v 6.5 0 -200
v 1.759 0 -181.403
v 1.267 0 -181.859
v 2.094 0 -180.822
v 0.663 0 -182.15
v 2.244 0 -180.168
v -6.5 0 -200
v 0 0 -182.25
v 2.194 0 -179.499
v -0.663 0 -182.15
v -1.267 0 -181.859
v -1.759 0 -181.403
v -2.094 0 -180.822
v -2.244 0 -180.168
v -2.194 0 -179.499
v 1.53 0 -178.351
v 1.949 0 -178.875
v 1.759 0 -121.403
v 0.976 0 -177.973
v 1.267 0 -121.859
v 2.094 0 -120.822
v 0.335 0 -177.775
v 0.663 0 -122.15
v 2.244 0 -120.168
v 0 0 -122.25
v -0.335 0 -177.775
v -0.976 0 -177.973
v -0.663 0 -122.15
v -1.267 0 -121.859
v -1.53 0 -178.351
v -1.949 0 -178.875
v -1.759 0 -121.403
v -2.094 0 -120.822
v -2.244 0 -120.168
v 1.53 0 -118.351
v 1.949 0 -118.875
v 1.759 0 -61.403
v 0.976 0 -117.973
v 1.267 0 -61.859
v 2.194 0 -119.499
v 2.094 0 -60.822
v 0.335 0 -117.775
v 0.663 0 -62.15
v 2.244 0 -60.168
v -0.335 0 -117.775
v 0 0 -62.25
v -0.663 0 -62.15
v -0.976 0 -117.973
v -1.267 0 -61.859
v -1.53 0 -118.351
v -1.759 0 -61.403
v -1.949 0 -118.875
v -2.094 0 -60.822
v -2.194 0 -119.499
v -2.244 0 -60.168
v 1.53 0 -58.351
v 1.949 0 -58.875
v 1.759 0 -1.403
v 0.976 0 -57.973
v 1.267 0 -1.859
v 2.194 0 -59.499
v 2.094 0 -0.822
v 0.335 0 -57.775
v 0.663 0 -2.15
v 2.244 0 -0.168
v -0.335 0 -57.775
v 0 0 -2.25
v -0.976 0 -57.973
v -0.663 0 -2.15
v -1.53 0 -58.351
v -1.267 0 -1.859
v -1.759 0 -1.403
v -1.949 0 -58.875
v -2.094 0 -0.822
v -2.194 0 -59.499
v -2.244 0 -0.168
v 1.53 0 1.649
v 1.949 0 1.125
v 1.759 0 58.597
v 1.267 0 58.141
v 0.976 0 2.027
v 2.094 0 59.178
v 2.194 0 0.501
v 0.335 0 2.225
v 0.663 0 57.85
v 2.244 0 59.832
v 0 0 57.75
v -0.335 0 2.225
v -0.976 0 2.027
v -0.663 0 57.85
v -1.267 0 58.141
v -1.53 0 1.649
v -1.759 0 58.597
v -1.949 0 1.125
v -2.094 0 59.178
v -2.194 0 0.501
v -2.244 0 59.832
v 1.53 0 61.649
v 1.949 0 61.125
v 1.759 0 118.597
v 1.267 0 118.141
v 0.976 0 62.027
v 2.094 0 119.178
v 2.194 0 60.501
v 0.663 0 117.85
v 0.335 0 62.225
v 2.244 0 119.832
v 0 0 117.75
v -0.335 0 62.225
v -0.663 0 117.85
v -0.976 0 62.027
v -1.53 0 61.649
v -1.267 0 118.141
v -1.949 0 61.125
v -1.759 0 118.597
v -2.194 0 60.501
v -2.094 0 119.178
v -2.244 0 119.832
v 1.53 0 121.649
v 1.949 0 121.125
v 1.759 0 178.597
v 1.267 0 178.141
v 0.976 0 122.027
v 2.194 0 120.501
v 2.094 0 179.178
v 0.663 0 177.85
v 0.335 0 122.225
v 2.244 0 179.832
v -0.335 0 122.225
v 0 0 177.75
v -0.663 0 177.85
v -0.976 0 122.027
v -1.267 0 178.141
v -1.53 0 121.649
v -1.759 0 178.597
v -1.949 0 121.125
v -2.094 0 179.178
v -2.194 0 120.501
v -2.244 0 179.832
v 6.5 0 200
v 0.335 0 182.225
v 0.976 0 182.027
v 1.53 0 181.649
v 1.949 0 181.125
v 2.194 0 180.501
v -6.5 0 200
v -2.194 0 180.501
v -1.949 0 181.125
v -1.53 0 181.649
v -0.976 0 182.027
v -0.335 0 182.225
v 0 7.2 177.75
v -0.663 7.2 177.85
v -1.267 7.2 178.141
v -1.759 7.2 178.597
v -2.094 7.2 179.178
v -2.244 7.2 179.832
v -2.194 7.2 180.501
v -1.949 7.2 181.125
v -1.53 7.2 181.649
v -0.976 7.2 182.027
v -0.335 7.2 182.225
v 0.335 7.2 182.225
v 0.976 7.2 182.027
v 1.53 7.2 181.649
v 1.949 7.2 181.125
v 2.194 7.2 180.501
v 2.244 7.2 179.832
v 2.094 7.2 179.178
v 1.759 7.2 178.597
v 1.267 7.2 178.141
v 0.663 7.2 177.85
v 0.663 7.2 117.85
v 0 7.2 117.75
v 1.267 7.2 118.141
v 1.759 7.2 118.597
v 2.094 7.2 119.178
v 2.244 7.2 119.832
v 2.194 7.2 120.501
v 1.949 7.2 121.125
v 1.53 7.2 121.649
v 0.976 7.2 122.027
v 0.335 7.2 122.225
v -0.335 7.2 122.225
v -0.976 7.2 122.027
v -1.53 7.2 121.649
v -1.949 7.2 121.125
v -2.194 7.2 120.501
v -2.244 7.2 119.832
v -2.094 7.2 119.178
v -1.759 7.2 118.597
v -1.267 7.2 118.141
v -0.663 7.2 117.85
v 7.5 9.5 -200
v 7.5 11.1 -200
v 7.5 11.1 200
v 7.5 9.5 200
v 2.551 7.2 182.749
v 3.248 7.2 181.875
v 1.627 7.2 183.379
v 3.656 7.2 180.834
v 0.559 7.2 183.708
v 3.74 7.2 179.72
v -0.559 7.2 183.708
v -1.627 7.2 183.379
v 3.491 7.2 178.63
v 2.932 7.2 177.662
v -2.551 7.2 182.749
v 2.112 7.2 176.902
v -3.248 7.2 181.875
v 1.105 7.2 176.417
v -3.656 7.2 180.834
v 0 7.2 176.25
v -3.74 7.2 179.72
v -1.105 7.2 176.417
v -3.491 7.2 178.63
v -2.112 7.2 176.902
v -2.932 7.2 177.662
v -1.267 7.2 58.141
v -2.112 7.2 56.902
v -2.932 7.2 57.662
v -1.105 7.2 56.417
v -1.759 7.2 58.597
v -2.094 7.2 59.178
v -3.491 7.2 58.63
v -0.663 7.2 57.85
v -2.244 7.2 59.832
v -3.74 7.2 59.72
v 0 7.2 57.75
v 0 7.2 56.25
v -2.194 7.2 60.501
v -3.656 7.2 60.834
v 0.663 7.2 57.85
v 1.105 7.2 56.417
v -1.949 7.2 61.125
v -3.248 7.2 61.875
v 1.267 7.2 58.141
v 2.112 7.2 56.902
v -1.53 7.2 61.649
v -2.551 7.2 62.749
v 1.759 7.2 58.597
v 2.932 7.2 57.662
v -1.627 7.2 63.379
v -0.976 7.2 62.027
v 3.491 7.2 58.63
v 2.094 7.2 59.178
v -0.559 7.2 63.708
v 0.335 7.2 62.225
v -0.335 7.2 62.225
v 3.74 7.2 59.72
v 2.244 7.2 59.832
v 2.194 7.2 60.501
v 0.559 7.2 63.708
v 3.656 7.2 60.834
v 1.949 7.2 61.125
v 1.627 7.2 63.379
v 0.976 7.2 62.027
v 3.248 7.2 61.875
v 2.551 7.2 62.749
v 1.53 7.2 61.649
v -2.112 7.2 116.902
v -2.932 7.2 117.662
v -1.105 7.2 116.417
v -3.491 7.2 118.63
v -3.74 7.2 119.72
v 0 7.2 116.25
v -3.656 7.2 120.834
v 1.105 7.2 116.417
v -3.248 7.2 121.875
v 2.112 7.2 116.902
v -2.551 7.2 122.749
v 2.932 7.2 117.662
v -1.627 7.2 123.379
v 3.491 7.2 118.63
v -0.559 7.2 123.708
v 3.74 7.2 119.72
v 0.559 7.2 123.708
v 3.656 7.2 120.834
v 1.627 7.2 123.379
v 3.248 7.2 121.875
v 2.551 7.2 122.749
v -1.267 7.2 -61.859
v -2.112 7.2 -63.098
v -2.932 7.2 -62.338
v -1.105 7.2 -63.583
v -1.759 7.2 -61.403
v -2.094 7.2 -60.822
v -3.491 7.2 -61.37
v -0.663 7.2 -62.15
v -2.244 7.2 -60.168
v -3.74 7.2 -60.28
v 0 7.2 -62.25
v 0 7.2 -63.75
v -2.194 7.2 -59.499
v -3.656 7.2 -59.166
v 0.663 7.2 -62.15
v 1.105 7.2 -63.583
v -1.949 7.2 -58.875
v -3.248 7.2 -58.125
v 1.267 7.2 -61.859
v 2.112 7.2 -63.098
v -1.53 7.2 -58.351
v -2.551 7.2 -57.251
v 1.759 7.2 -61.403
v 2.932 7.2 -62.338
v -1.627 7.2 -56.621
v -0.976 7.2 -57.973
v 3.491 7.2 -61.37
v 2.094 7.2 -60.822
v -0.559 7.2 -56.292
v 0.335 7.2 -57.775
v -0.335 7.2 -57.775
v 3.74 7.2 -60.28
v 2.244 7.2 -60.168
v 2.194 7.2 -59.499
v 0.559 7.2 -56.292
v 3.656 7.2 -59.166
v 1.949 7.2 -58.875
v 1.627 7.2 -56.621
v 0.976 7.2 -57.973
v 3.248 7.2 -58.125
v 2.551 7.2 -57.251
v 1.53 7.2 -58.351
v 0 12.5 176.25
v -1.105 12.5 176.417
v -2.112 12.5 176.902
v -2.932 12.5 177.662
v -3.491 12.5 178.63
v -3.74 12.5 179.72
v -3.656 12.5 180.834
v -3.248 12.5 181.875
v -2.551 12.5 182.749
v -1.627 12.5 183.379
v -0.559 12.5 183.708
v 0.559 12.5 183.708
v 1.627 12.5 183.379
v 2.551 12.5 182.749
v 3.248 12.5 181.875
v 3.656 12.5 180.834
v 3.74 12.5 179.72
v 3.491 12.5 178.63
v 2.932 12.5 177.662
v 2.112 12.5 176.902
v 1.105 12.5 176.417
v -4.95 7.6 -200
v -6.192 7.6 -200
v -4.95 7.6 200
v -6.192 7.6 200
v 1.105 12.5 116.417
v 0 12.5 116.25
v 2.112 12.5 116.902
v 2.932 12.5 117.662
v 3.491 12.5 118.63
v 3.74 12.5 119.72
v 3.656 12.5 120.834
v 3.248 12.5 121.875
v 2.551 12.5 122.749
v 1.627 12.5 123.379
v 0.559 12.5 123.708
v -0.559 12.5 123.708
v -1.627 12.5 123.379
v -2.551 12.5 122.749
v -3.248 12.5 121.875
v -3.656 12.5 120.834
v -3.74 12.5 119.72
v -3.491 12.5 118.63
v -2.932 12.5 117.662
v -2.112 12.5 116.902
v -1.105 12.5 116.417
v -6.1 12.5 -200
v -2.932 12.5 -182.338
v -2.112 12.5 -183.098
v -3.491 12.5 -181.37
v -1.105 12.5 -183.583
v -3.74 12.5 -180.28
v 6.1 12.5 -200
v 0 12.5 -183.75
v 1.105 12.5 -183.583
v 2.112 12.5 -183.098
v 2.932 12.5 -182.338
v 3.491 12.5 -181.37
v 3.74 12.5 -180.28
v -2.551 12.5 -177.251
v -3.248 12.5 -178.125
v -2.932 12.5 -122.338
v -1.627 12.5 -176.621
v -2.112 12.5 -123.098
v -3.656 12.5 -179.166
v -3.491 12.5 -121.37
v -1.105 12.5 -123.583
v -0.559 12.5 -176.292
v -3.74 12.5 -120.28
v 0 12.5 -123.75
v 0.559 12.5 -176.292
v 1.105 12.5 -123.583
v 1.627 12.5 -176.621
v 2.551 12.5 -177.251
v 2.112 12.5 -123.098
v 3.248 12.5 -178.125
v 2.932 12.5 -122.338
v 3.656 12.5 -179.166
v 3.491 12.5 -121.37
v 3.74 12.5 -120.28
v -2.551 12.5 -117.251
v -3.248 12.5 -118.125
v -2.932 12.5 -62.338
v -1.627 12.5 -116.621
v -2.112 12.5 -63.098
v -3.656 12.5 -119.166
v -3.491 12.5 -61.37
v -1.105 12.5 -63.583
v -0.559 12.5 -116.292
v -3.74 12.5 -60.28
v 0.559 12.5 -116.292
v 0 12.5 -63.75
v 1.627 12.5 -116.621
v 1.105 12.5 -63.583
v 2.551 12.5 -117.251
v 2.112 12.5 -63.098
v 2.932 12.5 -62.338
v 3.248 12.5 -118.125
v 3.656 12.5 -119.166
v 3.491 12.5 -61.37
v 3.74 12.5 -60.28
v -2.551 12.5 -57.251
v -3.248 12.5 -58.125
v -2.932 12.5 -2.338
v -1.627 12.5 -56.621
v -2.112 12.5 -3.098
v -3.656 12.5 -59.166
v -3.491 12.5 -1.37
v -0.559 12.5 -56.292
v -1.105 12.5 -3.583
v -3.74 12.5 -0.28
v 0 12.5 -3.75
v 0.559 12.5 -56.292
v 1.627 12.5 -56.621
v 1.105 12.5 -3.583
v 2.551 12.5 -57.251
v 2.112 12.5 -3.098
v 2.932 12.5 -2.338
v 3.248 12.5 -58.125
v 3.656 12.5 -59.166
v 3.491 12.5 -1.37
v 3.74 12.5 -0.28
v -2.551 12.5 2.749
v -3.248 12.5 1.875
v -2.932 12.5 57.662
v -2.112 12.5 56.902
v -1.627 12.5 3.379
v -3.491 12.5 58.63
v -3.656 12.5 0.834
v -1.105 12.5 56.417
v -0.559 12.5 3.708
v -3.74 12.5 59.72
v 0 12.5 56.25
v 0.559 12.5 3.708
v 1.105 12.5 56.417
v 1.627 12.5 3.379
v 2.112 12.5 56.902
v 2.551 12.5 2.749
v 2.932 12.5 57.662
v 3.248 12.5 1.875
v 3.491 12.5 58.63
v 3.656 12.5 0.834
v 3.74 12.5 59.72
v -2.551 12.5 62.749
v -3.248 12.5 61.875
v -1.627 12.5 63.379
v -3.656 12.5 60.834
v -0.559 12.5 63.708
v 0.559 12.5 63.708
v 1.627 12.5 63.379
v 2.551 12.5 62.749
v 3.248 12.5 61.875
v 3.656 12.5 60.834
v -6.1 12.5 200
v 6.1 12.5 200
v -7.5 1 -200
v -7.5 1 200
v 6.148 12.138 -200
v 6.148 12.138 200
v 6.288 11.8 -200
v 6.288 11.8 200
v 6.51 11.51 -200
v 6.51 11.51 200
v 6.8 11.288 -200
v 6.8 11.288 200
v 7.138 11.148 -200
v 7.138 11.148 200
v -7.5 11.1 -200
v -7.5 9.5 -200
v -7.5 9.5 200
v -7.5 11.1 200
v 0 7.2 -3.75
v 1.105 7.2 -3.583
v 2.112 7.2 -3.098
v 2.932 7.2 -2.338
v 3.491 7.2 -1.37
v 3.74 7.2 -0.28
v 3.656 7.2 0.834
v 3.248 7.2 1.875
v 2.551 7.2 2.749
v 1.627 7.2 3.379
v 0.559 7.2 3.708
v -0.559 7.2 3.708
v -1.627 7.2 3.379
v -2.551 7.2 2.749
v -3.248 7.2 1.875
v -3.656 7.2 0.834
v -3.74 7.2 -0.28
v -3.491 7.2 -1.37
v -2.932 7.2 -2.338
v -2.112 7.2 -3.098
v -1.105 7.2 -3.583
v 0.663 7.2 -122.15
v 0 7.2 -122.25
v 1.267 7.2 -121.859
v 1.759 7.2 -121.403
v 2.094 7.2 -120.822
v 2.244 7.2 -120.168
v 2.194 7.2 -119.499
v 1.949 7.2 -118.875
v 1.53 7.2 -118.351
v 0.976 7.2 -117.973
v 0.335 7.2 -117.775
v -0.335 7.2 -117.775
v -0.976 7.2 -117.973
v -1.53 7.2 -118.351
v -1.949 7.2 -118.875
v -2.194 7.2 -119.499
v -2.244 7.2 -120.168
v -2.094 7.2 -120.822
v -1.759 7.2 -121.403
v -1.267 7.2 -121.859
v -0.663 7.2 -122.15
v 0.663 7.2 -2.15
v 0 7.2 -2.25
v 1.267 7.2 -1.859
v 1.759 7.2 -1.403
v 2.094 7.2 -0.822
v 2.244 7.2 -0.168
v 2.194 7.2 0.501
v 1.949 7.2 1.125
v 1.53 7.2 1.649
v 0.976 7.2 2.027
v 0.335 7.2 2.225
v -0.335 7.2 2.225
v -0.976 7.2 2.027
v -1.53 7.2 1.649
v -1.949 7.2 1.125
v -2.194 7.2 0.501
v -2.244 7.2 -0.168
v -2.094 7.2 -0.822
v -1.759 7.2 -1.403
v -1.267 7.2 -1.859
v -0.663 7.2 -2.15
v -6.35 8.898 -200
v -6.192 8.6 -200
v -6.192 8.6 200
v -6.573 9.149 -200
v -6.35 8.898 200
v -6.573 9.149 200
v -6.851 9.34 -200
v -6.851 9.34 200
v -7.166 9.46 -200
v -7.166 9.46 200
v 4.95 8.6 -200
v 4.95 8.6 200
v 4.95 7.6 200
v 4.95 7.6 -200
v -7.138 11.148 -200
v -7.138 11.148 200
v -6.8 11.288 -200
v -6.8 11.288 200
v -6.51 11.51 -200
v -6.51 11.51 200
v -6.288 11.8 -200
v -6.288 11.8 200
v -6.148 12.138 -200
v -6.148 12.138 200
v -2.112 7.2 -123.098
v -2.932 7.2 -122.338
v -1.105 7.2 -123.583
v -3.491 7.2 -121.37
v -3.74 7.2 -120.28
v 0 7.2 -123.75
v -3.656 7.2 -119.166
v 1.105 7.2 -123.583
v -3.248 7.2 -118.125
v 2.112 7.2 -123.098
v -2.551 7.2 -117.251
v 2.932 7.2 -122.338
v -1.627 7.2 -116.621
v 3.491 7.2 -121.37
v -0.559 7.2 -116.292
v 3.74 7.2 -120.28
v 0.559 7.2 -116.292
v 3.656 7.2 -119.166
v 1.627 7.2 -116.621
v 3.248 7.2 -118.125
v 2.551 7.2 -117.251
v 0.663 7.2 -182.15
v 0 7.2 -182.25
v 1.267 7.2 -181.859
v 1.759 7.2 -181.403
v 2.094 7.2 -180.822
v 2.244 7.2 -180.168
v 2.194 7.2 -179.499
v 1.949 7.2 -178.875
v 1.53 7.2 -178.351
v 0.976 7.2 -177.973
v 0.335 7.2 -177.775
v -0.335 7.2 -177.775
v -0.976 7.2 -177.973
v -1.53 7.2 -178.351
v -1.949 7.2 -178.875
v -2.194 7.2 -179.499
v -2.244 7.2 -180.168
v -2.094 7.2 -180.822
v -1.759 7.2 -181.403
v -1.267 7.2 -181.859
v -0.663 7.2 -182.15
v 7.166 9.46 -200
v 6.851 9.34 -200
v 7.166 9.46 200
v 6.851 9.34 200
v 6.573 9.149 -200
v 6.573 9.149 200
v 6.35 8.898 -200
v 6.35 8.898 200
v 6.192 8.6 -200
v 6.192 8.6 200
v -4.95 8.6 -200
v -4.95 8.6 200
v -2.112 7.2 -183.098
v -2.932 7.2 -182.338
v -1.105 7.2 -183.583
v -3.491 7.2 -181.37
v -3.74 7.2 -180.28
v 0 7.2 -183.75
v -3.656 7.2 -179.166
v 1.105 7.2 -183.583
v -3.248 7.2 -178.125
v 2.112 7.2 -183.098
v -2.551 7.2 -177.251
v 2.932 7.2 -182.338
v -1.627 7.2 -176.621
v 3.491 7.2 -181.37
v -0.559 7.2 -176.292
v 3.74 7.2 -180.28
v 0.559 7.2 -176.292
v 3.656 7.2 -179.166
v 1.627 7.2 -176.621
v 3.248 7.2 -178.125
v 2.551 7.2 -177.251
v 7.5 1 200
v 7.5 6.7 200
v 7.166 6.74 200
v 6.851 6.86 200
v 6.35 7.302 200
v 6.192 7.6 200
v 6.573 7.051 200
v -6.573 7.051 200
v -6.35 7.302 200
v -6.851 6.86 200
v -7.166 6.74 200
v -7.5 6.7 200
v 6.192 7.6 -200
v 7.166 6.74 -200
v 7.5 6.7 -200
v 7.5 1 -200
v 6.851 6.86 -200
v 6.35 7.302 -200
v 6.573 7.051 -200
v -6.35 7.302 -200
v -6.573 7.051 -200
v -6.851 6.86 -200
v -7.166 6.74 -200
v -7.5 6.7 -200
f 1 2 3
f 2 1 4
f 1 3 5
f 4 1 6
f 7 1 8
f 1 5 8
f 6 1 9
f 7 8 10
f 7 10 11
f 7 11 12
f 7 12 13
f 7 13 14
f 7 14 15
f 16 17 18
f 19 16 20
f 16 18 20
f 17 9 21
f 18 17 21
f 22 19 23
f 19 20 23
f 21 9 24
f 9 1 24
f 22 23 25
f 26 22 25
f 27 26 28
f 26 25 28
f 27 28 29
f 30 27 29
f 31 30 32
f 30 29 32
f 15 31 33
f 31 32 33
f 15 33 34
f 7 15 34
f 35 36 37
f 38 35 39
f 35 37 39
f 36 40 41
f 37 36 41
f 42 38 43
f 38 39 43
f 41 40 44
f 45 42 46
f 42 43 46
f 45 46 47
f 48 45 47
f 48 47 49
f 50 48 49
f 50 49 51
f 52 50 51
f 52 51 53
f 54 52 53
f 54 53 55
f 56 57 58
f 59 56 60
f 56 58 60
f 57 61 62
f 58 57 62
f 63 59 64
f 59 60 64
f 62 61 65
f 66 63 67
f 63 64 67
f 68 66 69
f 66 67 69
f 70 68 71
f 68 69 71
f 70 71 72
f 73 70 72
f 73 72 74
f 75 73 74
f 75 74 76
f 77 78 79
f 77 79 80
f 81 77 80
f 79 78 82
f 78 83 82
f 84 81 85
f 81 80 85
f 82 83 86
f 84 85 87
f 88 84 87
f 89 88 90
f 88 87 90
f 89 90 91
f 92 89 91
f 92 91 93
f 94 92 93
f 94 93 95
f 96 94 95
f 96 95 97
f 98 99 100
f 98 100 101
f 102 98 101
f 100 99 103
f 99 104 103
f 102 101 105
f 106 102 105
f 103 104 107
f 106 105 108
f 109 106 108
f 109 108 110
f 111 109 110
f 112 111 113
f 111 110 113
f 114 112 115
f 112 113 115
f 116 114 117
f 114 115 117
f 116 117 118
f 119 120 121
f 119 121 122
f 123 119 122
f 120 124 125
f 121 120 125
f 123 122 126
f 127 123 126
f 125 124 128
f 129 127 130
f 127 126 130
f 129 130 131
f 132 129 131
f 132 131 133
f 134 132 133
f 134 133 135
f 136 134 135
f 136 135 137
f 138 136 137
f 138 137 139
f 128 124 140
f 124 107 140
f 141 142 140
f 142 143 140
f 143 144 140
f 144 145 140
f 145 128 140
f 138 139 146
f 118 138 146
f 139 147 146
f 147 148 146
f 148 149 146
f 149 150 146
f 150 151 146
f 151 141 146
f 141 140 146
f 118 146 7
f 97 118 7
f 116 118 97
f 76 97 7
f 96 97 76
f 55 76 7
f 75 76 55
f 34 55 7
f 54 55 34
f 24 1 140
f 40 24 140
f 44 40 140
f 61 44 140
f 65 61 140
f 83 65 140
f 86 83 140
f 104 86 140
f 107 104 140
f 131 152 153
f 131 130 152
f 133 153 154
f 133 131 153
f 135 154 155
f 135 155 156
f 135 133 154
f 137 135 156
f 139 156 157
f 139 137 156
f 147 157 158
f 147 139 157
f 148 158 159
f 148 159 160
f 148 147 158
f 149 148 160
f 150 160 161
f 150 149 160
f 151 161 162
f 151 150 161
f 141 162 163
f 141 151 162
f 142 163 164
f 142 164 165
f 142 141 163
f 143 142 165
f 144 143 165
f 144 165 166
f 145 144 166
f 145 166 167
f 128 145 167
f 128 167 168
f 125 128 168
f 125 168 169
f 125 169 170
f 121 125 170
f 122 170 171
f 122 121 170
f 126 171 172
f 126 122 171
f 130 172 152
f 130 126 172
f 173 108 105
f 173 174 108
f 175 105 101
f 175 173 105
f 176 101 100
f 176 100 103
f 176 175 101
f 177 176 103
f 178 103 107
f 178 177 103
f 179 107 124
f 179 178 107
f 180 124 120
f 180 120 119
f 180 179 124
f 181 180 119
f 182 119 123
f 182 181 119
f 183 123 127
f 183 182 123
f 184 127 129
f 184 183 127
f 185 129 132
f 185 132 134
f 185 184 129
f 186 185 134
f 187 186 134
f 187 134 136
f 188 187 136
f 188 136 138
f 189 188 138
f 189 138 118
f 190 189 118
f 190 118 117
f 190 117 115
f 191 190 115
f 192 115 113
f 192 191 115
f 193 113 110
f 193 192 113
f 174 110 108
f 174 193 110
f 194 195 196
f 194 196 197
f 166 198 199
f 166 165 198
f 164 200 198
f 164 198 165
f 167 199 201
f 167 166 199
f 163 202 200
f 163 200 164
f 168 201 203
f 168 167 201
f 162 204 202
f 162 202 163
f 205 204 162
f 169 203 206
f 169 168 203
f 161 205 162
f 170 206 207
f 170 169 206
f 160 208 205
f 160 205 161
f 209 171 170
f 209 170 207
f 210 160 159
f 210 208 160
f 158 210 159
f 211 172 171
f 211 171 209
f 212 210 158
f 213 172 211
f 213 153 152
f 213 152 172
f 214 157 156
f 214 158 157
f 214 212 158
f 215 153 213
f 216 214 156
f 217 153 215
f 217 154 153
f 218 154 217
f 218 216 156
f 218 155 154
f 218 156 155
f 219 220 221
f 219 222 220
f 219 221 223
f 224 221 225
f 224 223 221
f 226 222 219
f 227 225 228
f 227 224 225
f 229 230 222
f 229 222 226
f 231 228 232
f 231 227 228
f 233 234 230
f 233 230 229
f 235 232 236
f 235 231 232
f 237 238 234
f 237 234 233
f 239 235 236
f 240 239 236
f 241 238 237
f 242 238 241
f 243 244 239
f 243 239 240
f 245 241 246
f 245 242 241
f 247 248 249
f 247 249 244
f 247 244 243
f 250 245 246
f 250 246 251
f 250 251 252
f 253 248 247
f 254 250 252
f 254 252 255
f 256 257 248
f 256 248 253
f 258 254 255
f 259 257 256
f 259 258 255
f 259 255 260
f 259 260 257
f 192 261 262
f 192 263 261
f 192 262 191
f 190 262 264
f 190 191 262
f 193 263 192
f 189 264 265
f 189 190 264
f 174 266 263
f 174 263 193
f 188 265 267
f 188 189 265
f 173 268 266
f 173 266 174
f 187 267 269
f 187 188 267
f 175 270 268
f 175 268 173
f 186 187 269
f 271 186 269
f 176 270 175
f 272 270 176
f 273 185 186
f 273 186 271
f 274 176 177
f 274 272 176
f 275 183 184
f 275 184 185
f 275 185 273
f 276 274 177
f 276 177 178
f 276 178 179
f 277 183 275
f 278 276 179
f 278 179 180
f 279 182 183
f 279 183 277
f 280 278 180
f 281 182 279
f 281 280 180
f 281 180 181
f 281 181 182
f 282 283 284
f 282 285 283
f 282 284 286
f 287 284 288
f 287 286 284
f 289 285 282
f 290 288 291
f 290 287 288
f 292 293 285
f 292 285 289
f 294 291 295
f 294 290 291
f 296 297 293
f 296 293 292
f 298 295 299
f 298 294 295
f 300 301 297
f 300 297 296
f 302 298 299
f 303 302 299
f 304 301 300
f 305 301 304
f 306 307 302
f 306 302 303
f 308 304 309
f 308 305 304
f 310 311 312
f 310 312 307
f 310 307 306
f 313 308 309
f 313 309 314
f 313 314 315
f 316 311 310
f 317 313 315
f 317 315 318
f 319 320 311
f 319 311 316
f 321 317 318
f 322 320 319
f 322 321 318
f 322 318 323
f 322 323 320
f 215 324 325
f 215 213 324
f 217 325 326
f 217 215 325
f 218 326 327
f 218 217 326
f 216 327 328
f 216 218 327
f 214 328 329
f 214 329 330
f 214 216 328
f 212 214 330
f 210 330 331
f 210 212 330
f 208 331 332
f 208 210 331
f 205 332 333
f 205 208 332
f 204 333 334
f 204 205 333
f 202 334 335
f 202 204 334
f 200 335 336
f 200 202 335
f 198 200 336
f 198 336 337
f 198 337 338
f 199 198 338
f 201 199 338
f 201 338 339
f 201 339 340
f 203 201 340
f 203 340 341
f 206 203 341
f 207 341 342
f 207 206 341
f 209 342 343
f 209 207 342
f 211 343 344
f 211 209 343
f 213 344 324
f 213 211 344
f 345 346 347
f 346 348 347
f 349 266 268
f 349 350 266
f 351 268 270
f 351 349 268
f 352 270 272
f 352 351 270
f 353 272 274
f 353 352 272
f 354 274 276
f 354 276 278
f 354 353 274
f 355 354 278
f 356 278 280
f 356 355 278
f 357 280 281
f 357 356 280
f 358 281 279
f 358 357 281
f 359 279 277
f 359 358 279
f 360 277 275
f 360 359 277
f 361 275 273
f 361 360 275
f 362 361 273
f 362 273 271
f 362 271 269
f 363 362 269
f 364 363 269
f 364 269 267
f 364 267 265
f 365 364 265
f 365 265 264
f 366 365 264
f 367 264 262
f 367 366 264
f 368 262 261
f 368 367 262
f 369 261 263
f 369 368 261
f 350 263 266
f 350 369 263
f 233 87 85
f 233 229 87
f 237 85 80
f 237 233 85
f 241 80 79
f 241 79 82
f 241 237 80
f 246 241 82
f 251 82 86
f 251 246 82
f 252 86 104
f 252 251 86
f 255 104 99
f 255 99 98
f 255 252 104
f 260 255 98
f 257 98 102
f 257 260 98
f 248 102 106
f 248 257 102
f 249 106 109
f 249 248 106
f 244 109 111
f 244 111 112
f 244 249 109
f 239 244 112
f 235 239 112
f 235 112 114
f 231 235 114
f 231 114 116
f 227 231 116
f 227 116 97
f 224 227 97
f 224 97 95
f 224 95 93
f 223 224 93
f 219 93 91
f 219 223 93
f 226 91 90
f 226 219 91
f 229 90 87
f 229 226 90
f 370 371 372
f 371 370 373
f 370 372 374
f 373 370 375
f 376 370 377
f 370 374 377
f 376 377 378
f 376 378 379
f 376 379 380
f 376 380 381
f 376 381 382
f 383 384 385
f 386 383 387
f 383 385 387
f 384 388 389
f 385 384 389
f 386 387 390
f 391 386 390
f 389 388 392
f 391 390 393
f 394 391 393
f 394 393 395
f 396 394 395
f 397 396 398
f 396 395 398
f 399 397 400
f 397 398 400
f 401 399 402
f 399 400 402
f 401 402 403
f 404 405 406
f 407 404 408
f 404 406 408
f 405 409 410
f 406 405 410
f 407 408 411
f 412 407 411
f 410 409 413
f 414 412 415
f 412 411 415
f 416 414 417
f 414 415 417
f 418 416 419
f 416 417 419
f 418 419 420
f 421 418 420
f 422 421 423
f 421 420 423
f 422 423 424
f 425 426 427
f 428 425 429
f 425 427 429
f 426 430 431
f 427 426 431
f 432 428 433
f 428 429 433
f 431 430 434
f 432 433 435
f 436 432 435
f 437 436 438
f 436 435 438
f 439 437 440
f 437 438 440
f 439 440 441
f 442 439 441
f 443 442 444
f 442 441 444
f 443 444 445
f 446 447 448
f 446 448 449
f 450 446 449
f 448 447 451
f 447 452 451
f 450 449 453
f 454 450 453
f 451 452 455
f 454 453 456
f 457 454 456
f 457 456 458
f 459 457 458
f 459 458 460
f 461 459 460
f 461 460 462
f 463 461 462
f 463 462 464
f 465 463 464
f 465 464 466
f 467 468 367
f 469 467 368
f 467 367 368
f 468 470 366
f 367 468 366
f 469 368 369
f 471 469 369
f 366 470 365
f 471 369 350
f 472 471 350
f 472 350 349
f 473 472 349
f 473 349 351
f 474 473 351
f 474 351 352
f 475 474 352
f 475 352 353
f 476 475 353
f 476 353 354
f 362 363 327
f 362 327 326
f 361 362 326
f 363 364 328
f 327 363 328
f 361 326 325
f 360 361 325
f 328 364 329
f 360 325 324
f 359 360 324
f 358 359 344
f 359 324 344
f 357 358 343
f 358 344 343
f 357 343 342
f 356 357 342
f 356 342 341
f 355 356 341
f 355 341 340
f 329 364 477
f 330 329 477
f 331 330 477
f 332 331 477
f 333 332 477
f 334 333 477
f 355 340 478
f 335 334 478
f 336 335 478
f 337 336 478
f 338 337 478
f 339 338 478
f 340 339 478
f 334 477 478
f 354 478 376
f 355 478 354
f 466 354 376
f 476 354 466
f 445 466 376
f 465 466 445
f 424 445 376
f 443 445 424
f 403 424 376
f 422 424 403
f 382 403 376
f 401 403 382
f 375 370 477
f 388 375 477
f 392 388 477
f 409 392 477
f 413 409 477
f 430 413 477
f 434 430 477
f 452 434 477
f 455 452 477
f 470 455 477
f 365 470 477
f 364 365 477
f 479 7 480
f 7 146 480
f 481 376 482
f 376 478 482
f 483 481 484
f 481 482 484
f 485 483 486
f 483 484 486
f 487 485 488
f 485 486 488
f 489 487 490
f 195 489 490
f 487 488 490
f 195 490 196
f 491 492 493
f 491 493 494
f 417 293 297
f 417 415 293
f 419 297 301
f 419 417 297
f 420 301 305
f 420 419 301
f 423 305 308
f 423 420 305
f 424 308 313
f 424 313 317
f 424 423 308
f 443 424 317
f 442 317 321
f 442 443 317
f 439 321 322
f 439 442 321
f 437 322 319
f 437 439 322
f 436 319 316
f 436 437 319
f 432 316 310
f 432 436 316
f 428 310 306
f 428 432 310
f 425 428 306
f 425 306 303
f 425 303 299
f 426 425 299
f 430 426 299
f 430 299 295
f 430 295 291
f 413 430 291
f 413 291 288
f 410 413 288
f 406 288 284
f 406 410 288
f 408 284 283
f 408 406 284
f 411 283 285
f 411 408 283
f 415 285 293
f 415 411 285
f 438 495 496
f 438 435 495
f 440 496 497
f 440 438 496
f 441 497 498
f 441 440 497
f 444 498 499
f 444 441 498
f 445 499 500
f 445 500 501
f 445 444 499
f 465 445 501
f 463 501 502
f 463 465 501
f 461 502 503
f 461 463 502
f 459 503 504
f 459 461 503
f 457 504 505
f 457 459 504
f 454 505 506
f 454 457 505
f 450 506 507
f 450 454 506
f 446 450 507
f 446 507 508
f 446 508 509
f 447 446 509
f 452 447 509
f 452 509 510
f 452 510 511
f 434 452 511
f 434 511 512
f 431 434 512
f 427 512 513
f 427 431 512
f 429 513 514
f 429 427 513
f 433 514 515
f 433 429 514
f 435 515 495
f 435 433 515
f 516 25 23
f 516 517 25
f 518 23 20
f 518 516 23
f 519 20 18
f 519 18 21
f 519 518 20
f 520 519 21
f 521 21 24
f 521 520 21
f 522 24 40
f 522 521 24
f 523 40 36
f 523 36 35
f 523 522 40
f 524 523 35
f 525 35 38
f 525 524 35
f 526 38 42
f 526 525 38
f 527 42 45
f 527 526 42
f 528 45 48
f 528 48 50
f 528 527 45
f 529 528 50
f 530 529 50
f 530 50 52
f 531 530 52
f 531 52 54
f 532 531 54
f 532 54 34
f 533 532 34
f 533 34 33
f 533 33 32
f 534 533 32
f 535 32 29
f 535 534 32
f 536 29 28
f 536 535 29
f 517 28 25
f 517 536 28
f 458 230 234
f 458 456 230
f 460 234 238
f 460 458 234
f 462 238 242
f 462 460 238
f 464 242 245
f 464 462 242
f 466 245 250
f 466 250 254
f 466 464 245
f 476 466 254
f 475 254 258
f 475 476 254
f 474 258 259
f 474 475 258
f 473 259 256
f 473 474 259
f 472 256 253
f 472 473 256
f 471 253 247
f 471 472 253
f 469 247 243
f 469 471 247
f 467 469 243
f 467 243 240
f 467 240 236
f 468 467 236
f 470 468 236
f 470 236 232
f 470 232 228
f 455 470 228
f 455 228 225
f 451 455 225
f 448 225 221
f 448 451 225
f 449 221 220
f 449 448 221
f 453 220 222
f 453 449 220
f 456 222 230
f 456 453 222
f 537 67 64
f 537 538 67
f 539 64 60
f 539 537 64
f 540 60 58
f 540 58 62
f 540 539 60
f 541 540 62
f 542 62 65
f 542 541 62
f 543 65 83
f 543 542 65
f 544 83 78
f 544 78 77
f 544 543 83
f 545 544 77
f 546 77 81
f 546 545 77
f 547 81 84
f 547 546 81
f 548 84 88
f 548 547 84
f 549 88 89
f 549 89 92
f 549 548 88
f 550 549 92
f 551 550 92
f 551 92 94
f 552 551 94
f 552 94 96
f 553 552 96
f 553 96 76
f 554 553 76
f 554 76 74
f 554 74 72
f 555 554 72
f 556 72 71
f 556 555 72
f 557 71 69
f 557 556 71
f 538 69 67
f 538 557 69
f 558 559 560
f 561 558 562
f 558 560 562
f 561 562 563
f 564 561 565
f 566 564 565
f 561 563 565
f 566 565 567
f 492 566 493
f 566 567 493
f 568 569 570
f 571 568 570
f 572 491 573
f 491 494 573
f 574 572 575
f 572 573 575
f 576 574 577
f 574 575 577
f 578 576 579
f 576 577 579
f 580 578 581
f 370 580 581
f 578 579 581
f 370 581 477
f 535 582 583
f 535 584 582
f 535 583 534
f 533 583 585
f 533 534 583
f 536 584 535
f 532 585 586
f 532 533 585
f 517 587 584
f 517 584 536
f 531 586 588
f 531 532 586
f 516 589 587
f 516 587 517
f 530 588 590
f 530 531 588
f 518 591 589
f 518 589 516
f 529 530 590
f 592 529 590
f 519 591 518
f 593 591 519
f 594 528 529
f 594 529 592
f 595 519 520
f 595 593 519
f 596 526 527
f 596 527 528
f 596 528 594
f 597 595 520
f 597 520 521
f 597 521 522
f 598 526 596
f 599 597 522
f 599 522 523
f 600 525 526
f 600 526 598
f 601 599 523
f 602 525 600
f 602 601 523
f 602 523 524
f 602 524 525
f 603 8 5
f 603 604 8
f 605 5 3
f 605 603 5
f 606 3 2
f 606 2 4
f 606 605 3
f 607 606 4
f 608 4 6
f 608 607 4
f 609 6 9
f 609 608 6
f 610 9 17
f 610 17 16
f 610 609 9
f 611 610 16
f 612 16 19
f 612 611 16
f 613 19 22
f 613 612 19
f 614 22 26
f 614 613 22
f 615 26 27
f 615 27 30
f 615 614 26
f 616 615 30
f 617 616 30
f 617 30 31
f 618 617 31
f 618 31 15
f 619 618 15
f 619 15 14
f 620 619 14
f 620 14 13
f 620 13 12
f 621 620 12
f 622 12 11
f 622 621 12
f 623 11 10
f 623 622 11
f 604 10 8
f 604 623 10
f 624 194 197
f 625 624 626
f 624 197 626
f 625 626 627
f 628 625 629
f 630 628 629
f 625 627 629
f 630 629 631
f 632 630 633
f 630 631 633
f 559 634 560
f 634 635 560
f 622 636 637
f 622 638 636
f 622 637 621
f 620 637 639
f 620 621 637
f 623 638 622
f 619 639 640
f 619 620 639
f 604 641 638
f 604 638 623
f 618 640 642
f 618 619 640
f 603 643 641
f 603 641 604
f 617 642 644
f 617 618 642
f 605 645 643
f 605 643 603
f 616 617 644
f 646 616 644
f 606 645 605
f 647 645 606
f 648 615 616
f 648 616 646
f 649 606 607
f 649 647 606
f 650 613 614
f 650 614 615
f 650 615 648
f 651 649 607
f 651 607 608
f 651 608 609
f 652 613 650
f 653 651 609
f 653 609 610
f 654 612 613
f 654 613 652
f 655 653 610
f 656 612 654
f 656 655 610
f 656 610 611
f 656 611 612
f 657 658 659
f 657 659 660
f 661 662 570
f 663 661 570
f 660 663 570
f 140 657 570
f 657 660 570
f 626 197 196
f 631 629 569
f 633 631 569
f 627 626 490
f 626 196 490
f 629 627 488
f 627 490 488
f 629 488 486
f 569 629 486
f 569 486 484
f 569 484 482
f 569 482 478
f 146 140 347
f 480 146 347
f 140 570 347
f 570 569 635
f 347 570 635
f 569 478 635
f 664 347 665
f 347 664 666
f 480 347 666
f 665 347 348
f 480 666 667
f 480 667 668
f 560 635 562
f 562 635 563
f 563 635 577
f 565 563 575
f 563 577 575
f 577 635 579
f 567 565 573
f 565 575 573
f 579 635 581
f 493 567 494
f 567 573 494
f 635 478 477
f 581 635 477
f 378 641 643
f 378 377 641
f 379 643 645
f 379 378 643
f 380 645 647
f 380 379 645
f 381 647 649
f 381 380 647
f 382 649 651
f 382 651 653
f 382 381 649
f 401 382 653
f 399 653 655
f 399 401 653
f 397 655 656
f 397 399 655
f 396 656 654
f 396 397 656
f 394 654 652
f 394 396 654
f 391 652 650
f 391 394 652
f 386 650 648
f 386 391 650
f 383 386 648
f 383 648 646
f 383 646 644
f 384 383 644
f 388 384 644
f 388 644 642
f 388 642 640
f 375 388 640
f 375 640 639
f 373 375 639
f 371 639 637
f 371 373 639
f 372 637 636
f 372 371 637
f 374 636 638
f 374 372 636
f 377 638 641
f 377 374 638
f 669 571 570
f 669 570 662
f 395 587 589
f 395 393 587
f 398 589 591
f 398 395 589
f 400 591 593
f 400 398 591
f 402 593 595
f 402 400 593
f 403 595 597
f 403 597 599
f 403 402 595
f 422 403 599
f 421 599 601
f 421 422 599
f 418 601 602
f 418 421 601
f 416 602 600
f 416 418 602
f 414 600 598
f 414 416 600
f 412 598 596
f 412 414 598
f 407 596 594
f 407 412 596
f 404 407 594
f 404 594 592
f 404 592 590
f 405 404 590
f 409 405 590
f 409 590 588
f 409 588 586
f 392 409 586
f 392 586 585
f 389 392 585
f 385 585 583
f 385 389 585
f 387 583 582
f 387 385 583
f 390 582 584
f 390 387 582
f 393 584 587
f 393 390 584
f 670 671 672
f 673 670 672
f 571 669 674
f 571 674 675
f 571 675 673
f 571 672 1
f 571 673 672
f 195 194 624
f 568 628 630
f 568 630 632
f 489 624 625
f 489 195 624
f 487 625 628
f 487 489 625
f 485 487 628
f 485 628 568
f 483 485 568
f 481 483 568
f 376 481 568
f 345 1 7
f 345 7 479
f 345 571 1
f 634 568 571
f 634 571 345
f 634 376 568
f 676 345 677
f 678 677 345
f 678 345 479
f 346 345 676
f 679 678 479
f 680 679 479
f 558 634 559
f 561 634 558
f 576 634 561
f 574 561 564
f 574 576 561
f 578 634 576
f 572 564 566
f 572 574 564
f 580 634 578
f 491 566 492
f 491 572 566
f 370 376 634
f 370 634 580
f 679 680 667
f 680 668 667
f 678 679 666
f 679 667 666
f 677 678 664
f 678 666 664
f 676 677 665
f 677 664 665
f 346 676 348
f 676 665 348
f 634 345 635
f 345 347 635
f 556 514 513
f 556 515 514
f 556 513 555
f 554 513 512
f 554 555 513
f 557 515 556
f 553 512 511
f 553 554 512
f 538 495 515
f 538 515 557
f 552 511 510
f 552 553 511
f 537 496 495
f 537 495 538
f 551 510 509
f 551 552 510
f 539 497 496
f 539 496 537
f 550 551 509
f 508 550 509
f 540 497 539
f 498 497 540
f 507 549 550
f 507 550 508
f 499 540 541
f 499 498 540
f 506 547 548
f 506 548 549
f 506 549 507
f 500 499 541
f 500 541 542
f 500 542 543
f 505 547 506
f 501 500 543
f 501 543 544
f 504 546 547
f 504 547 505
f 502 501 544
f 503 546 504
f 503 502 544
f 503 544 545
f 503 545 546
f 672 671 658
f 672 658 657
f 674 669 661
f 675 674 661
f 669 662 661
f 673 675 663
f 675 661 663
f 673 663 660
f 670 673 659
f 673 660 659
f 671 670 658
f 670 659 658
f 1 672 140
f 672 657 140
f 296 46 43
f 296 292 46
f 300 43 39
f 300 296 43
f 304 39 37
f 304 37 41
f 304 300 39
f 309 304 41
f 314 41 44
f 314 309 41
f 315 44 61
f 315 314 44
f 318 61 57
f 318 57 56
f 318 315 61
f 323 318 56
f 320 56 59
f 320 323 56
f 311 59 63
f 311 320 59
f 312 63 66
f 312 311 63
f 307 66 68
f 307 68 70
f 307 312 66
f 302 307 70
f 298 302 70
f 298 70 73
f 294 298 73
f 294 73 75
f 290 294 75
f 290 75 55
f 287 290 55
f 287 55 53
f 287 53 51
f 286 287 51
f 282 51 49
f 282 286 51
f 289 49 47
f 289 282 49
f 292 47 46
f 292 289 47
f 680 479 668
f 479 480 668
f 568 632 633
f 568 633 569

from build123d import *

# Parameters (mm, degrees)
EXTRUDE1_DEPTH  = 200
LPATTERN1_COUNT = 6
LPATTERN1_PITCH = 60


with BuildPart() as part:
    # 15mm → Extrude1 (new, symmetric)
    with BuildSketch(Plane.XY):
        with BuildLine():
            Line((4.949972, 7.600006), (6.192321846, 7.599996))
            ThreePointArc((6.192321846, 7.599996), (6.706266371, 6.946742527), (7.49999, 6.7))
            Line((7.49999, 6.7), (7.49999, 1.000024142))
            Line((7.49999, 1.000024142), (6.499965858, 0))
            Line((6.499965858, 0), (-6.499965858, 0))
            Line((-6.499965858, 0), (-7.49999, 1.000024142))
            Line((-7.49999, 1.000024142), (-7.49999, 6.7))
            ThreePointArc((-7.49999, 6.7), (-6.70626637, 6.946742527), (-6.192321846, 7.599996))
            Line((-6.192321846, 7.599996), (-4.949982, 7.599996))
            Line((-4.949982, 7.599996), (-4.949972, 8.600006))
            Line((-4.949972, 8.600006), (-6.192326435, 8.600016))
            ThreePointArc((-6.192326435, 8.600016), (-6.706271662, 9.253261115), (-7.49999, 9.5))
            Line((-7.49999, 9.5), (-7.49999, 11.099974))
            ThreePointArc((-7.49999, 11.099974), (-6.510037425, 11.510033031), (-6.099989, 12.49999))
            Line((-6.099989, 12.49999), (6.099989, 12.49999))
            ThreePointArc((6.099989, 12.49999), (6.510037425, 11.510033031), (7.49999, 11.099974))
            Line((7.49999, 11.099974), (7.49999, 9.5))
            ThreePointArc((7.49999, 9.5), (6.706271662, 9.253261115), (6.192326435, 8.600016))
            Line((6.192326435, 8.600016), (4.949982, 8.600016))
            Line((4.949982, 8.600016), (4.949972, 7.600006))
        make_face()
    extrude(amount=EXTRUDE1_DEPTH, both=True)

    # Sketch1 → Cut-Revolve1 (revolve, cut)
    with BuildSketch(Plane(origin=(0, 0, 0), x_dir=(0, 0, -1), z_dir=(1, 0, 0))):
        Polygon((-180, 12.49999), (-176.25, 12.49999), (-176.25, 7.19999), (-177.75, 7.19999), (-177.75, 0), (-180, 0), align=None)
    revolve(axis=Axis((0, 0, 180), (0, 1, 0)), mode=Mode.SUBTRACT)

    # Sketch2 → Cut-Revolve2 (revolve, cut)
    with BuildSketch(Plane(origin=(0, 0, 0), x_dir=(0, 0, -1), z_dir=(1, 0, 0))):
        Polygon((180, 0), (182.25, 0), (182.25, 7.19999), (183.75, 7.19999), (183.75, 12.49999), (180, 12.49999), align=None)
    cut_revolve2 = revolve(axis=Axis((0, 12.49999, -180), (0, -1, 0)), mode=Mode.SUBTRACT)

    # LPattern1: Cut-Revolve2 ×6
    with Locations(*[(0, 0, i * LPATTERN1_PITCH) for i in range(1, LPATTERN1_COUNT)]):
        add(cut_revolve2, mode=Mode.SUBTRACT)


solid = part.part
